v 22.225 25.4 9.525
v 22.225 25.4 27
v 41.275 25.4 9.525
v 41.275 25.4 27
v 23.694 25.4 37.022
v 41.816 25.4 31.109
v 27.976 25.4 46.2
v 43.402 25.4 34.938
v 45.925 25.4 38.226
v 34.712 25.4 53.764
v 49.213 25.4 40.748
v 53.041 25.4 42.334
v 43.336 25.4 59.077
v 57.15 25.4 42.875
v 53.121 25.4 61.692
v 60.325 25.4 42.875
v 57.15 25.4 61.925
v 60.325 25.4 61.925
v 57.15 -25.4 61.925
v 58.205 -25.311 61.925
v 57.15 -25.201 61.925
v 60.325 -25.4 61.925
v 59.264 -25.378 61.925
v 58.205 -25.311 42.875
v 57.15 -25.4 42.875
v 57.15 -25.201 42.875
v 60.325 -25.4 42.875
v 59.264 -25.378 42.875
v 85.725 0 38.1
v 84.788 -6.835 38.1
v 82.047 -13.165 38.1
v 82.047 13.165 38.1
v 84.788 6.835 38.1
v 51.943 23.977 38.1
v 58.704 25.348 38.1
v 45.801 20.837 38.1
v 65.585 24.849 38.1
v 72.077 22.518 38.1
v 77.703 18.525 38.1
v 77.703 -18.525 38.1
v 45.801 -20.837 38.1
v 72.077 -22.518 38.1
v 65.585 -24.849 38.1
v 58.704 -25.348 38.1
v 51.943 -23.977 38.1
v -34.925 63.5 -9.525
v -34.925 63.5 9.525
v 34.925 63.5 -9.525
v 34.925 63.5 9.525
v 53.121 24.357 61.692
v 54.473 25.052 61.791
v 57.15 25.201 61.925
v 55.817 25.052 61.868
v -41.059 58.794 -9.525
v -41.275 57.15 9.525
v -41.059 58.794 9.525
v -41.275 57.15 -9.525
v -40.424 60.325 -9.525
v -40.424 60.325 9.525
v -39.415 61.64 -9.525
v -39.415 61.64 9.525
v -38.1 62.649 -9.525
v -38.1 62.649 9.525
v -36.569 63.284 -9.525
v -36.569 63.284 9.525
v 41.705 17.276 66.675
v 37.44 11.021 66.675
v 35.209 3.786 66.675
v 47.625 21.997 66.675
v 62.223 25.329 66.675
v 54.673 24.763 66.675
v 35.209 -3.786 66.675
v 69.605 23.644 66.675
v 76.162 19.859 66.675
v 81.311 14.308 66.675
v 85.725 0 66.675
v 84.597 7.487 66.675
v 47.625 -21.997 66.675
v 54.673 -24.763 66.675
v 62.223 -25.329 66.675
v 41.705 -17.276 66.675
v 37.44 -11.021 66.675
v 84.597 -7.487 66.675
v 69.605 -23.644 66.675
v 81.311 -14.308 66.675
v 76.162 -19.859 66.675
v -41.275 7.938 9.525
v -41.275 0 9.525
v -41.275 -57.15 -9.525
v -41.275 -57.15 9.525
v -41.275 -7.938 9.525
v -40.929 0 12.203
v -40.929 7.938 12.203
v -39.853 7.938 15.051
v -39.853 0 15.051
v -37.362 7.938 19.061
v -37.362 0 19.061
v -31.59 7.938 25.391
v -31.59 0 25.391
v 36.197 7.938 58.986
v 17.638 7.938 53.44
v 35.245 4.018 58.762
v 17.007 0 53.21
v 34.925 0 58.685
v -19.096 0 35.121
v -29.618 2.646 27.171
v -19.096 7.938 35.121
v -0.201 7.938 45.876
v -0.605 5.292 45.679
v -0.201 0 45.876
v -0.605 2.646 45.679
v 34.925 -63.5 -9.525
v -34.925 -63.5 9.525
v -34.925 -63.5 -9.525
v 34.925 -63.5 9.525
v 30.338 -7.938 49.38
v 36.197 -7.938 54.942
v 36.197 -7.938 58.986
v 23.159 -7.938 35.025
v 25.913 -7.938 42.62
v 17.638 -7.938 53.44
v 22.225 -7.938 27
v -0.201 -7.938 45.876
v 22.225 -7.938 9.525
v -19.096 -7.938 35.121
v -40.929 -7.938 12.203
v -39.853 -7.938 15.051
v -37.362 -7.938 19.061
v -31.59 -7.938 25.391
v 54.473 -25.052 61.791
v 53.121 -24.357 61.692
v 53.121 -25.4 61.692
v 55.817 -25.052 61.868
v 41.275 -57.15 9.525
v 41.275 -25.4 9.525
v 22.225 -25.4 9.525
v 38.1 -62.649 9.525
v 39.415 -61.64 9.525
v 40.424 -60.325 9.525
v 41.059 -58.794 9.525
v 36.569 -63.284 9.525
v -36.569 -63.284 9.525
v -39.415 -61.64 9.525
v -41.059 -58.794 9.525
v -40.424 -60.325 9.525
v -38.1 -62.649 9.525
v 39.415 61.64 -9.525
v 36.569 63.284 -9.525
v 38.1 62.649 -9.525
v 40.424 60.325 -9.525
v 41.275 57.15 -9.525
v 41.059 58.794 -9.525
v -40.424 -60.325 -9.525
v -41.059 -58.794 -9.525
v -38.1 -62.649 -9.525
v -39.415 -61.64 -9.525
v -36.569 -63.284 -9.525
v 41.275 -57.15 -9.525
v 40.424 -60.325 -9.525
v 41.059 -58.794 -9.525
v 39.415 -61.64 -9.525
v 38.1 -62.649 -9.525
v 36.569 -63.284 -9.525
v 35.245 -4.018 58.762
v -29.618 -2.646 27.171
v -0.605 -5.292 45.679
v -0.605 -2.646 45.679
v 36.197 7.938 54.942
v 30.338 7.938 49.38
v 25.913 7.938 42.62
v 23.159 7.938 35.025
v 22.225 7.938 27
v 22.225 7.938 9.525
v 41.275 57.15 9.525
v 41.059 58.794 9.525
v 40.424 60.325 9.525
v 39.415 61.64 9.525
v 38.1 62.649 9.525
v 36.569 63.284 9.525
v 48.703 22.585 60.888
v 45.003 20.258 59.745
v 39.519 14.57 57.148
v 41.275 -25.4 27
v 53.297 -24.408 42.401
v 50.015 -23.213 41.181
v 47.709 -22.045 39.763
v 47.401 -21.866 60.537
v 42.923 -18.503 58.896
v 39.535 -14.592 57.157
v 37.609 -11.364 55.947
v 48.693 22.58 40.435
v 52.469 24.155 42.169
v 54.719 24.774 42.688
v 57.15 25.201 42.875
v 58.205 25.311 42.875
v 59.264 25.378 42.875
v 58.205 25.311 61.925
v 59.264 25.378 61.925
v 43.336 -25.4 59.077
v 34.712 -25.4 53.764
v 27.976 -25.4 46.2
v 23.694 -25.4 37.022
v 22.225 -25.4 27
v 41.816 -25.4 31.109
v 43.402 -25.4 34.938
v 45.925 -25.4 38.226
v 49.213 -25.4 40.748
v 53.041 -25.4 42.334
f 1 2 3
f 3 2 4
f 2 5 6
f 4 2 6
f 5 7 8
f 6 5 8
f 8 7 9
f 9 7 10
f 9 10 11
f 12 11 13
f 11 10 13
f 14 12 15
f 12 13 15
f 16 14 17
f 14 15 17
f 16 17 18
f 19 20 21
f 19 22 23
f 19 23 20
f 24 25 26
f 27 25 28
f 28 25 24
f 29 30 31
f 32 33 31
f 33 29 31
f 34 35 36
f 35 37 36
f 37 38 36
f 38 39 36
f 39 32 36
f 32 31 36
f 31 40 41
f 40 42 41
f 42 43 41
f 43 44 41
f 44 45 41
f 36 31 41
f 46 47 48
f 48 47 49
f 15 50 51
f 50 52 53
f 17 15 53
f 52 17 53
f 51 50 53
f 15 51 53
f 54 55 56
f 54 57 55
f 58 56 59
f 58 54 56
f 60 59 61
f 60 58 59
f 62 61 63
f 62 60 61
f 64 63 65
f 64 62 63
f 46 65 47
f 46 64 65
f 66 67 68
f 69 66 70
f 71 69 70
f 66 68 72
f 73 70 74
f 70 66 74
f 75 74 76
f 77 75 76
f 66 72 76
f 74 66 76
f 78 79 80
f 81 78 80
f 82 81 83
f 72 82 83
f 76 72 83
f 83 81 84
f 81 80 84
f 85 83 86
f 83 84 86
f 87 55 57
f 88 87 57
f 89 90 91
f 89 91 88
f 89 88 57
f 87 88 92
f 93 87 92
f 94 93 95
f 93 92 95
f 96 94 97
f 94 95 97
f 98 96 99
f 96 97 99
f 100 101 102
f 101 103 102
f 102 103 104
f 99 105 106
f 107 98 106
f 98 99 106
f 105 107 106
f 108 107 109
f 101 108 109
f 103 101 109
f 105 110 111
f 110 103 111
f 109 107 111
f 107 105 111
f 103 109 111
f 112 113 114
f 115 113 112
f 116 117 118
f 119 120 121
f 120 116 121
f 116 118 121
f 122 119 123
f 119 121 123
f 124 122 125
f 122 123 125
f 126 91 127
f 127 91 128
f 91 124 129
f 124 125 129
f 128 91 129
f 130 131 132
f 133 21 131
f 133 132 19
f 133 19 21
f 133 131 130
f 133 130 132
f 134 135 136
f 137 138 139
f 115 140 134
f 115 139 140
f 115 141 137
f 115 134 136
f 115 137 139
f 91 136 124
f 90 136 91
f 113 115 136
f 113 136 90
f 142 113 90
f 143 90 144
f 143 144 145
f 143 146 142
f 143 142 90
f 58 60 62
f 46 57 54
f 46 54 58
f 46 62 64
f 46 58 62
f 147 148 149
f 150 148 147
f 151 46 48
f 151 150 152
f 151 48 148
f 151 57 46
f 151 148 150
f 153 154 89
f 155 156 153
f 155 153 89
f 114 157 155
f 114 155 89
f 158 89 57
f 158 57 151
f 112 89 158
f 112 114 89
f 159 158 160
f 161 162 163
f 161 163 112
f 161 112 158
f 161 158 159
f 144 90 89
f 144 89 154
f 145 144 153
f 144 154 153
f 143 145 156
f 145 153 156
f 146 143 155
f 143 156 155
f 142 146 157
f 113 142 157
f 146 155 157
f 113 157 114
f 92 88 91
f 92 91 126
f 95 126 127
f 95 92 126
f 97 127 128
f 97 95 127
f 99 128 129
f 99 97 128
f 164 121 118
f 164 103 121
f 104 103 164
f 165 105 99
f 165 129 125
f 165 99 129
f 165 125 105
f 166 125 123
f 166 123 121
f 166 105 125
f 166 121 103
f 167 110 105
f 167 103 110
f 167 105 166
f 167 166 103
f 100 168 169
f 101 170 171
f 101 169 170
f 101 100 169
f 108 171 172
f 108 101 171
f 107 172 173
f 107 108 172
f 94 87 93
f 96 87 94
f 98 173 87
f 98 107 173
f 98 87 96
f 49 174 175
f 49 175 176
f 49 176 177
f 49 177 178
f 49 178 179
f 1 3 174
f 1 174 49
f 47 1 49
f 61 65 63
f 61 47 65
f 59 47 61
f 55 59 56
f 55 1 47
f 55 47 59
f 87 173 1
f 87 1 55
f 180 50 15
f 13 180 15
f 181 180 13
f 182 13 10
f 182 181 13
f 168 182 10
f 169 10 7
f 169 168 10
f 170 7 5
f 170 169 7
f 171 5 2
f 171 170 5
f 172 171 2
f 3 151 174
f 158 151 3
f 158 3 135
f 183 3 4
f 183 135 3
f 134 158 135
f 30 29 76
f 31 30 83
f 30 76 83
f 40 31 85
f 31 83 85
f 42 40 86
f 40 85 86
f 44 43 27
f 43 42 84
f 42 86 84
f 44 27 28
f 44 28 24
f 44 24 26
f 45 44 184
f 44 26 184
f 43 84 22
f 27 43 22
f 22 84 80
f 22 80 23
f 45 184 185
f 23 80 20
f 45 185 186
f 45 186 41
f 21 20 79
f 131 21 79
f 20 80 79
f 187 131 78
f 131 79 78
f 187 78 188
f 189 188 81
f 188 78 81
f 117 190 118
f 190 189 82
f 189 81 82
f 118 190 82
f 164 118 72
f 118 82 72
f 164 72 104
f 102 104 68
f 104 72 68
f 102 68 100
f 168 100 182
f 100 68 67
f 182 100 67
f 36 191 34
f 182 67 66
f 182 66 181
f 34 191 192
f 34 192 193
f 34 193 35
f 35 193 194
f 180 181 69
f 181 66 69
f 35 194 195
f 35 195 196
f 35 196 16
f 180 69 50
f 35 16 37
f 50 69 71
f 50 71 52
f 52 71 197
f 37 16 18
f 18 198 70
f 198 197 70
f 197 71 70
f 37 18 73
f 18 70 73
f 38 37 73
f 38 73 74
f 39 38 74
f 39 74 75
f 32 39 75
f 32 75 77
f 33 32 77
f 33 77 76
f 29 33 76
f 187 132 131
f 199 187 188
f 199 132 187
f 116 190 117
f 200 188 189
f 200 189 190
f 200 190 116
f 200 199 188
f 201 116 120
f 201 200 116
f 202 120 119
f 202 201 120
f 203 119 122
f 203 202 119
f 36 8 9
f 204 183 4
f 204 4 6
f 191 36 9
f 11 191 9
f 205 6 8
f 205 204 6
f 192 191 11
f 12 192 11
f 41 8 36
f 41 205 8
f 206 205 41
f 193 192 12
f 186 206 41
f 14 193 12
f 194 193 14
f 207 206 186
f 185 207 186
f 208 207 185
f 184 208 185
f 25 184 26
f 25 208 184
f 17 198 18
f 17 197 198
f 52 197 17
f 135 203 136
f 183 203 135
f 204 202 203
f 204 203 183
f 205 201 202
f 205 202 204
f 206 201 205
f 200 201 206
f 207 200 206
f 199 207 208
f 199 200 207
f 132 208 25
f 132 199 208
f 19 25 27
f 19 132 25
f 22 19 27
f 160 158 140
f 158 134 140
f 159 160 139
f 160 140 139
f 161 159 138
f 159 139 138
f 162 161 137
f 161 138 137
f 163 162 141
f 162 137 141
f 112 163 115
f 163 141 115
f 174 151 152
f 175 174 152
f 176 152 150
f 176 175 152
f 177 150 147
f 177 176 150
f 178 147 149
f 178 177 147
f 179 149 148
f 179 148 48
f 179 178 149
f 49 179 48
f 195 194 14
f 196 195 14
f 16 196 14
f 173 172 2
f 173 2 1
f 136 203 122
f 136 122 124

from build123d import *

# Parameters (mm, degrees)
F1_DEPTH = 63.5
F2_DEPTH = 25.4
F3_DEPTH = 7.9375
F5_R     = 6.35


with BuildPart() as f1:
    # F0 (on Front) → F1 (new body, symmetric)
    with BuildSketch(Plane.XZ):
        Polygon((22.225, 9.525), (-41.275, 9.525), (-41.275, -9.525), (41.275, -9.525), (41.275, 9.525), align=None)
    extrude(amount=F1_DEPTH, both=True)

    # F0 (on Front) → F2 (join, symmetric)
    with BuildSketch(Plane.XZ):
        with BuildLine():
            Line((22.225, 27.0002), (22.225, 9.525))
            Line((22.225, 9.525), (41.275, 9.525))
            Line((41.275, 9.525), (41.275, 27.0002))
            ThreePointArc((41.275, 27.0002), (45.92468, 38.22552), (57.15, 42.8752))
            Line((57.15, 42.8752), (60.325, 42.8752))
            Line((60.325, 42.8752), (60.325, 61.9252))
            Line((60.325, 61.9252), (57.15, 61.9252))
            add(Edge.make_bspline(
                [(53.120623, 61.691982), (54.477951, 61.800732), (55.821866, 61.878972), (57.15, 61.9252)],
                knots=[107.944302, 107.944302, 107.944302, 107.944302, 111.504536, 111.504536, 111.504536, 111.504536], degree=3))
            ThreePointArc((53.120623, 61.691982), (31.068574, 50.227658), (22.225, 27.0002))
        make_face()
    extrude(amount=F2_DEPTH, both=True)

    # F0 (on Front) → F3 (join, symmetric)
    with BuildSketch(Plane.XZ):
        with BuildLine():
            add(Edge.make_bspline(
                [(-41.275, 9.525), (-41.51543, 27.050941), (11.967215, 58.394754), (53.120623, 61.691982)],
                knots=[0, 0, 0, 0, 107.944302, 107.944302, 107.944302, 107.944302], degree=3))
            Line((-41.275, 9.525), (22.225, 9.525))
            Line((22.225, 9.525), (22.225, 27.0002))
            ThreePointArc((22.225, 27.0002), (31.068574, 50.227658), (53.120623, 61.691982))
        make_face()
    extrude(amount=F3_DEPTH, both=True)

    # F0 (on Front) → F4 (revolve)
    with BuildSketch(Plane.XZ):
        Polygon((60.325, 66.675), (60.325, 61.9252), (65.104299, 61.9252), (85.725, 61.9252), (85.725, 66.675), align=None)
        Polygon((65.104299, 61.9252), (60.325, 61.9252), (60.325, 42.8752), (65.104299, 42.8752), (85.725, 42.8752), (85.725, 61.9252), align=None)
        Polygon((65.104299, 42.8752), (60.325, 42.8752), (60.325, 38.1), (85.725, 38.1), (85.725, 42.8752), align=None)
    revolve(axis=Axis((60.325, 0, 52.3875), (0, 0, -1)))

    # F5
    f5_edges = [f1.edges().sort_by_distance(p)[0] for p in [
        (41.275, -63.5, 0),
        (-41.275, -63.5, 0),
        (41.275, 63.5, 0),
        (-41.275, 63.5, 0),
    ]]
    fillet(f5_edges, radius=F5_R)


solid = f1.part
